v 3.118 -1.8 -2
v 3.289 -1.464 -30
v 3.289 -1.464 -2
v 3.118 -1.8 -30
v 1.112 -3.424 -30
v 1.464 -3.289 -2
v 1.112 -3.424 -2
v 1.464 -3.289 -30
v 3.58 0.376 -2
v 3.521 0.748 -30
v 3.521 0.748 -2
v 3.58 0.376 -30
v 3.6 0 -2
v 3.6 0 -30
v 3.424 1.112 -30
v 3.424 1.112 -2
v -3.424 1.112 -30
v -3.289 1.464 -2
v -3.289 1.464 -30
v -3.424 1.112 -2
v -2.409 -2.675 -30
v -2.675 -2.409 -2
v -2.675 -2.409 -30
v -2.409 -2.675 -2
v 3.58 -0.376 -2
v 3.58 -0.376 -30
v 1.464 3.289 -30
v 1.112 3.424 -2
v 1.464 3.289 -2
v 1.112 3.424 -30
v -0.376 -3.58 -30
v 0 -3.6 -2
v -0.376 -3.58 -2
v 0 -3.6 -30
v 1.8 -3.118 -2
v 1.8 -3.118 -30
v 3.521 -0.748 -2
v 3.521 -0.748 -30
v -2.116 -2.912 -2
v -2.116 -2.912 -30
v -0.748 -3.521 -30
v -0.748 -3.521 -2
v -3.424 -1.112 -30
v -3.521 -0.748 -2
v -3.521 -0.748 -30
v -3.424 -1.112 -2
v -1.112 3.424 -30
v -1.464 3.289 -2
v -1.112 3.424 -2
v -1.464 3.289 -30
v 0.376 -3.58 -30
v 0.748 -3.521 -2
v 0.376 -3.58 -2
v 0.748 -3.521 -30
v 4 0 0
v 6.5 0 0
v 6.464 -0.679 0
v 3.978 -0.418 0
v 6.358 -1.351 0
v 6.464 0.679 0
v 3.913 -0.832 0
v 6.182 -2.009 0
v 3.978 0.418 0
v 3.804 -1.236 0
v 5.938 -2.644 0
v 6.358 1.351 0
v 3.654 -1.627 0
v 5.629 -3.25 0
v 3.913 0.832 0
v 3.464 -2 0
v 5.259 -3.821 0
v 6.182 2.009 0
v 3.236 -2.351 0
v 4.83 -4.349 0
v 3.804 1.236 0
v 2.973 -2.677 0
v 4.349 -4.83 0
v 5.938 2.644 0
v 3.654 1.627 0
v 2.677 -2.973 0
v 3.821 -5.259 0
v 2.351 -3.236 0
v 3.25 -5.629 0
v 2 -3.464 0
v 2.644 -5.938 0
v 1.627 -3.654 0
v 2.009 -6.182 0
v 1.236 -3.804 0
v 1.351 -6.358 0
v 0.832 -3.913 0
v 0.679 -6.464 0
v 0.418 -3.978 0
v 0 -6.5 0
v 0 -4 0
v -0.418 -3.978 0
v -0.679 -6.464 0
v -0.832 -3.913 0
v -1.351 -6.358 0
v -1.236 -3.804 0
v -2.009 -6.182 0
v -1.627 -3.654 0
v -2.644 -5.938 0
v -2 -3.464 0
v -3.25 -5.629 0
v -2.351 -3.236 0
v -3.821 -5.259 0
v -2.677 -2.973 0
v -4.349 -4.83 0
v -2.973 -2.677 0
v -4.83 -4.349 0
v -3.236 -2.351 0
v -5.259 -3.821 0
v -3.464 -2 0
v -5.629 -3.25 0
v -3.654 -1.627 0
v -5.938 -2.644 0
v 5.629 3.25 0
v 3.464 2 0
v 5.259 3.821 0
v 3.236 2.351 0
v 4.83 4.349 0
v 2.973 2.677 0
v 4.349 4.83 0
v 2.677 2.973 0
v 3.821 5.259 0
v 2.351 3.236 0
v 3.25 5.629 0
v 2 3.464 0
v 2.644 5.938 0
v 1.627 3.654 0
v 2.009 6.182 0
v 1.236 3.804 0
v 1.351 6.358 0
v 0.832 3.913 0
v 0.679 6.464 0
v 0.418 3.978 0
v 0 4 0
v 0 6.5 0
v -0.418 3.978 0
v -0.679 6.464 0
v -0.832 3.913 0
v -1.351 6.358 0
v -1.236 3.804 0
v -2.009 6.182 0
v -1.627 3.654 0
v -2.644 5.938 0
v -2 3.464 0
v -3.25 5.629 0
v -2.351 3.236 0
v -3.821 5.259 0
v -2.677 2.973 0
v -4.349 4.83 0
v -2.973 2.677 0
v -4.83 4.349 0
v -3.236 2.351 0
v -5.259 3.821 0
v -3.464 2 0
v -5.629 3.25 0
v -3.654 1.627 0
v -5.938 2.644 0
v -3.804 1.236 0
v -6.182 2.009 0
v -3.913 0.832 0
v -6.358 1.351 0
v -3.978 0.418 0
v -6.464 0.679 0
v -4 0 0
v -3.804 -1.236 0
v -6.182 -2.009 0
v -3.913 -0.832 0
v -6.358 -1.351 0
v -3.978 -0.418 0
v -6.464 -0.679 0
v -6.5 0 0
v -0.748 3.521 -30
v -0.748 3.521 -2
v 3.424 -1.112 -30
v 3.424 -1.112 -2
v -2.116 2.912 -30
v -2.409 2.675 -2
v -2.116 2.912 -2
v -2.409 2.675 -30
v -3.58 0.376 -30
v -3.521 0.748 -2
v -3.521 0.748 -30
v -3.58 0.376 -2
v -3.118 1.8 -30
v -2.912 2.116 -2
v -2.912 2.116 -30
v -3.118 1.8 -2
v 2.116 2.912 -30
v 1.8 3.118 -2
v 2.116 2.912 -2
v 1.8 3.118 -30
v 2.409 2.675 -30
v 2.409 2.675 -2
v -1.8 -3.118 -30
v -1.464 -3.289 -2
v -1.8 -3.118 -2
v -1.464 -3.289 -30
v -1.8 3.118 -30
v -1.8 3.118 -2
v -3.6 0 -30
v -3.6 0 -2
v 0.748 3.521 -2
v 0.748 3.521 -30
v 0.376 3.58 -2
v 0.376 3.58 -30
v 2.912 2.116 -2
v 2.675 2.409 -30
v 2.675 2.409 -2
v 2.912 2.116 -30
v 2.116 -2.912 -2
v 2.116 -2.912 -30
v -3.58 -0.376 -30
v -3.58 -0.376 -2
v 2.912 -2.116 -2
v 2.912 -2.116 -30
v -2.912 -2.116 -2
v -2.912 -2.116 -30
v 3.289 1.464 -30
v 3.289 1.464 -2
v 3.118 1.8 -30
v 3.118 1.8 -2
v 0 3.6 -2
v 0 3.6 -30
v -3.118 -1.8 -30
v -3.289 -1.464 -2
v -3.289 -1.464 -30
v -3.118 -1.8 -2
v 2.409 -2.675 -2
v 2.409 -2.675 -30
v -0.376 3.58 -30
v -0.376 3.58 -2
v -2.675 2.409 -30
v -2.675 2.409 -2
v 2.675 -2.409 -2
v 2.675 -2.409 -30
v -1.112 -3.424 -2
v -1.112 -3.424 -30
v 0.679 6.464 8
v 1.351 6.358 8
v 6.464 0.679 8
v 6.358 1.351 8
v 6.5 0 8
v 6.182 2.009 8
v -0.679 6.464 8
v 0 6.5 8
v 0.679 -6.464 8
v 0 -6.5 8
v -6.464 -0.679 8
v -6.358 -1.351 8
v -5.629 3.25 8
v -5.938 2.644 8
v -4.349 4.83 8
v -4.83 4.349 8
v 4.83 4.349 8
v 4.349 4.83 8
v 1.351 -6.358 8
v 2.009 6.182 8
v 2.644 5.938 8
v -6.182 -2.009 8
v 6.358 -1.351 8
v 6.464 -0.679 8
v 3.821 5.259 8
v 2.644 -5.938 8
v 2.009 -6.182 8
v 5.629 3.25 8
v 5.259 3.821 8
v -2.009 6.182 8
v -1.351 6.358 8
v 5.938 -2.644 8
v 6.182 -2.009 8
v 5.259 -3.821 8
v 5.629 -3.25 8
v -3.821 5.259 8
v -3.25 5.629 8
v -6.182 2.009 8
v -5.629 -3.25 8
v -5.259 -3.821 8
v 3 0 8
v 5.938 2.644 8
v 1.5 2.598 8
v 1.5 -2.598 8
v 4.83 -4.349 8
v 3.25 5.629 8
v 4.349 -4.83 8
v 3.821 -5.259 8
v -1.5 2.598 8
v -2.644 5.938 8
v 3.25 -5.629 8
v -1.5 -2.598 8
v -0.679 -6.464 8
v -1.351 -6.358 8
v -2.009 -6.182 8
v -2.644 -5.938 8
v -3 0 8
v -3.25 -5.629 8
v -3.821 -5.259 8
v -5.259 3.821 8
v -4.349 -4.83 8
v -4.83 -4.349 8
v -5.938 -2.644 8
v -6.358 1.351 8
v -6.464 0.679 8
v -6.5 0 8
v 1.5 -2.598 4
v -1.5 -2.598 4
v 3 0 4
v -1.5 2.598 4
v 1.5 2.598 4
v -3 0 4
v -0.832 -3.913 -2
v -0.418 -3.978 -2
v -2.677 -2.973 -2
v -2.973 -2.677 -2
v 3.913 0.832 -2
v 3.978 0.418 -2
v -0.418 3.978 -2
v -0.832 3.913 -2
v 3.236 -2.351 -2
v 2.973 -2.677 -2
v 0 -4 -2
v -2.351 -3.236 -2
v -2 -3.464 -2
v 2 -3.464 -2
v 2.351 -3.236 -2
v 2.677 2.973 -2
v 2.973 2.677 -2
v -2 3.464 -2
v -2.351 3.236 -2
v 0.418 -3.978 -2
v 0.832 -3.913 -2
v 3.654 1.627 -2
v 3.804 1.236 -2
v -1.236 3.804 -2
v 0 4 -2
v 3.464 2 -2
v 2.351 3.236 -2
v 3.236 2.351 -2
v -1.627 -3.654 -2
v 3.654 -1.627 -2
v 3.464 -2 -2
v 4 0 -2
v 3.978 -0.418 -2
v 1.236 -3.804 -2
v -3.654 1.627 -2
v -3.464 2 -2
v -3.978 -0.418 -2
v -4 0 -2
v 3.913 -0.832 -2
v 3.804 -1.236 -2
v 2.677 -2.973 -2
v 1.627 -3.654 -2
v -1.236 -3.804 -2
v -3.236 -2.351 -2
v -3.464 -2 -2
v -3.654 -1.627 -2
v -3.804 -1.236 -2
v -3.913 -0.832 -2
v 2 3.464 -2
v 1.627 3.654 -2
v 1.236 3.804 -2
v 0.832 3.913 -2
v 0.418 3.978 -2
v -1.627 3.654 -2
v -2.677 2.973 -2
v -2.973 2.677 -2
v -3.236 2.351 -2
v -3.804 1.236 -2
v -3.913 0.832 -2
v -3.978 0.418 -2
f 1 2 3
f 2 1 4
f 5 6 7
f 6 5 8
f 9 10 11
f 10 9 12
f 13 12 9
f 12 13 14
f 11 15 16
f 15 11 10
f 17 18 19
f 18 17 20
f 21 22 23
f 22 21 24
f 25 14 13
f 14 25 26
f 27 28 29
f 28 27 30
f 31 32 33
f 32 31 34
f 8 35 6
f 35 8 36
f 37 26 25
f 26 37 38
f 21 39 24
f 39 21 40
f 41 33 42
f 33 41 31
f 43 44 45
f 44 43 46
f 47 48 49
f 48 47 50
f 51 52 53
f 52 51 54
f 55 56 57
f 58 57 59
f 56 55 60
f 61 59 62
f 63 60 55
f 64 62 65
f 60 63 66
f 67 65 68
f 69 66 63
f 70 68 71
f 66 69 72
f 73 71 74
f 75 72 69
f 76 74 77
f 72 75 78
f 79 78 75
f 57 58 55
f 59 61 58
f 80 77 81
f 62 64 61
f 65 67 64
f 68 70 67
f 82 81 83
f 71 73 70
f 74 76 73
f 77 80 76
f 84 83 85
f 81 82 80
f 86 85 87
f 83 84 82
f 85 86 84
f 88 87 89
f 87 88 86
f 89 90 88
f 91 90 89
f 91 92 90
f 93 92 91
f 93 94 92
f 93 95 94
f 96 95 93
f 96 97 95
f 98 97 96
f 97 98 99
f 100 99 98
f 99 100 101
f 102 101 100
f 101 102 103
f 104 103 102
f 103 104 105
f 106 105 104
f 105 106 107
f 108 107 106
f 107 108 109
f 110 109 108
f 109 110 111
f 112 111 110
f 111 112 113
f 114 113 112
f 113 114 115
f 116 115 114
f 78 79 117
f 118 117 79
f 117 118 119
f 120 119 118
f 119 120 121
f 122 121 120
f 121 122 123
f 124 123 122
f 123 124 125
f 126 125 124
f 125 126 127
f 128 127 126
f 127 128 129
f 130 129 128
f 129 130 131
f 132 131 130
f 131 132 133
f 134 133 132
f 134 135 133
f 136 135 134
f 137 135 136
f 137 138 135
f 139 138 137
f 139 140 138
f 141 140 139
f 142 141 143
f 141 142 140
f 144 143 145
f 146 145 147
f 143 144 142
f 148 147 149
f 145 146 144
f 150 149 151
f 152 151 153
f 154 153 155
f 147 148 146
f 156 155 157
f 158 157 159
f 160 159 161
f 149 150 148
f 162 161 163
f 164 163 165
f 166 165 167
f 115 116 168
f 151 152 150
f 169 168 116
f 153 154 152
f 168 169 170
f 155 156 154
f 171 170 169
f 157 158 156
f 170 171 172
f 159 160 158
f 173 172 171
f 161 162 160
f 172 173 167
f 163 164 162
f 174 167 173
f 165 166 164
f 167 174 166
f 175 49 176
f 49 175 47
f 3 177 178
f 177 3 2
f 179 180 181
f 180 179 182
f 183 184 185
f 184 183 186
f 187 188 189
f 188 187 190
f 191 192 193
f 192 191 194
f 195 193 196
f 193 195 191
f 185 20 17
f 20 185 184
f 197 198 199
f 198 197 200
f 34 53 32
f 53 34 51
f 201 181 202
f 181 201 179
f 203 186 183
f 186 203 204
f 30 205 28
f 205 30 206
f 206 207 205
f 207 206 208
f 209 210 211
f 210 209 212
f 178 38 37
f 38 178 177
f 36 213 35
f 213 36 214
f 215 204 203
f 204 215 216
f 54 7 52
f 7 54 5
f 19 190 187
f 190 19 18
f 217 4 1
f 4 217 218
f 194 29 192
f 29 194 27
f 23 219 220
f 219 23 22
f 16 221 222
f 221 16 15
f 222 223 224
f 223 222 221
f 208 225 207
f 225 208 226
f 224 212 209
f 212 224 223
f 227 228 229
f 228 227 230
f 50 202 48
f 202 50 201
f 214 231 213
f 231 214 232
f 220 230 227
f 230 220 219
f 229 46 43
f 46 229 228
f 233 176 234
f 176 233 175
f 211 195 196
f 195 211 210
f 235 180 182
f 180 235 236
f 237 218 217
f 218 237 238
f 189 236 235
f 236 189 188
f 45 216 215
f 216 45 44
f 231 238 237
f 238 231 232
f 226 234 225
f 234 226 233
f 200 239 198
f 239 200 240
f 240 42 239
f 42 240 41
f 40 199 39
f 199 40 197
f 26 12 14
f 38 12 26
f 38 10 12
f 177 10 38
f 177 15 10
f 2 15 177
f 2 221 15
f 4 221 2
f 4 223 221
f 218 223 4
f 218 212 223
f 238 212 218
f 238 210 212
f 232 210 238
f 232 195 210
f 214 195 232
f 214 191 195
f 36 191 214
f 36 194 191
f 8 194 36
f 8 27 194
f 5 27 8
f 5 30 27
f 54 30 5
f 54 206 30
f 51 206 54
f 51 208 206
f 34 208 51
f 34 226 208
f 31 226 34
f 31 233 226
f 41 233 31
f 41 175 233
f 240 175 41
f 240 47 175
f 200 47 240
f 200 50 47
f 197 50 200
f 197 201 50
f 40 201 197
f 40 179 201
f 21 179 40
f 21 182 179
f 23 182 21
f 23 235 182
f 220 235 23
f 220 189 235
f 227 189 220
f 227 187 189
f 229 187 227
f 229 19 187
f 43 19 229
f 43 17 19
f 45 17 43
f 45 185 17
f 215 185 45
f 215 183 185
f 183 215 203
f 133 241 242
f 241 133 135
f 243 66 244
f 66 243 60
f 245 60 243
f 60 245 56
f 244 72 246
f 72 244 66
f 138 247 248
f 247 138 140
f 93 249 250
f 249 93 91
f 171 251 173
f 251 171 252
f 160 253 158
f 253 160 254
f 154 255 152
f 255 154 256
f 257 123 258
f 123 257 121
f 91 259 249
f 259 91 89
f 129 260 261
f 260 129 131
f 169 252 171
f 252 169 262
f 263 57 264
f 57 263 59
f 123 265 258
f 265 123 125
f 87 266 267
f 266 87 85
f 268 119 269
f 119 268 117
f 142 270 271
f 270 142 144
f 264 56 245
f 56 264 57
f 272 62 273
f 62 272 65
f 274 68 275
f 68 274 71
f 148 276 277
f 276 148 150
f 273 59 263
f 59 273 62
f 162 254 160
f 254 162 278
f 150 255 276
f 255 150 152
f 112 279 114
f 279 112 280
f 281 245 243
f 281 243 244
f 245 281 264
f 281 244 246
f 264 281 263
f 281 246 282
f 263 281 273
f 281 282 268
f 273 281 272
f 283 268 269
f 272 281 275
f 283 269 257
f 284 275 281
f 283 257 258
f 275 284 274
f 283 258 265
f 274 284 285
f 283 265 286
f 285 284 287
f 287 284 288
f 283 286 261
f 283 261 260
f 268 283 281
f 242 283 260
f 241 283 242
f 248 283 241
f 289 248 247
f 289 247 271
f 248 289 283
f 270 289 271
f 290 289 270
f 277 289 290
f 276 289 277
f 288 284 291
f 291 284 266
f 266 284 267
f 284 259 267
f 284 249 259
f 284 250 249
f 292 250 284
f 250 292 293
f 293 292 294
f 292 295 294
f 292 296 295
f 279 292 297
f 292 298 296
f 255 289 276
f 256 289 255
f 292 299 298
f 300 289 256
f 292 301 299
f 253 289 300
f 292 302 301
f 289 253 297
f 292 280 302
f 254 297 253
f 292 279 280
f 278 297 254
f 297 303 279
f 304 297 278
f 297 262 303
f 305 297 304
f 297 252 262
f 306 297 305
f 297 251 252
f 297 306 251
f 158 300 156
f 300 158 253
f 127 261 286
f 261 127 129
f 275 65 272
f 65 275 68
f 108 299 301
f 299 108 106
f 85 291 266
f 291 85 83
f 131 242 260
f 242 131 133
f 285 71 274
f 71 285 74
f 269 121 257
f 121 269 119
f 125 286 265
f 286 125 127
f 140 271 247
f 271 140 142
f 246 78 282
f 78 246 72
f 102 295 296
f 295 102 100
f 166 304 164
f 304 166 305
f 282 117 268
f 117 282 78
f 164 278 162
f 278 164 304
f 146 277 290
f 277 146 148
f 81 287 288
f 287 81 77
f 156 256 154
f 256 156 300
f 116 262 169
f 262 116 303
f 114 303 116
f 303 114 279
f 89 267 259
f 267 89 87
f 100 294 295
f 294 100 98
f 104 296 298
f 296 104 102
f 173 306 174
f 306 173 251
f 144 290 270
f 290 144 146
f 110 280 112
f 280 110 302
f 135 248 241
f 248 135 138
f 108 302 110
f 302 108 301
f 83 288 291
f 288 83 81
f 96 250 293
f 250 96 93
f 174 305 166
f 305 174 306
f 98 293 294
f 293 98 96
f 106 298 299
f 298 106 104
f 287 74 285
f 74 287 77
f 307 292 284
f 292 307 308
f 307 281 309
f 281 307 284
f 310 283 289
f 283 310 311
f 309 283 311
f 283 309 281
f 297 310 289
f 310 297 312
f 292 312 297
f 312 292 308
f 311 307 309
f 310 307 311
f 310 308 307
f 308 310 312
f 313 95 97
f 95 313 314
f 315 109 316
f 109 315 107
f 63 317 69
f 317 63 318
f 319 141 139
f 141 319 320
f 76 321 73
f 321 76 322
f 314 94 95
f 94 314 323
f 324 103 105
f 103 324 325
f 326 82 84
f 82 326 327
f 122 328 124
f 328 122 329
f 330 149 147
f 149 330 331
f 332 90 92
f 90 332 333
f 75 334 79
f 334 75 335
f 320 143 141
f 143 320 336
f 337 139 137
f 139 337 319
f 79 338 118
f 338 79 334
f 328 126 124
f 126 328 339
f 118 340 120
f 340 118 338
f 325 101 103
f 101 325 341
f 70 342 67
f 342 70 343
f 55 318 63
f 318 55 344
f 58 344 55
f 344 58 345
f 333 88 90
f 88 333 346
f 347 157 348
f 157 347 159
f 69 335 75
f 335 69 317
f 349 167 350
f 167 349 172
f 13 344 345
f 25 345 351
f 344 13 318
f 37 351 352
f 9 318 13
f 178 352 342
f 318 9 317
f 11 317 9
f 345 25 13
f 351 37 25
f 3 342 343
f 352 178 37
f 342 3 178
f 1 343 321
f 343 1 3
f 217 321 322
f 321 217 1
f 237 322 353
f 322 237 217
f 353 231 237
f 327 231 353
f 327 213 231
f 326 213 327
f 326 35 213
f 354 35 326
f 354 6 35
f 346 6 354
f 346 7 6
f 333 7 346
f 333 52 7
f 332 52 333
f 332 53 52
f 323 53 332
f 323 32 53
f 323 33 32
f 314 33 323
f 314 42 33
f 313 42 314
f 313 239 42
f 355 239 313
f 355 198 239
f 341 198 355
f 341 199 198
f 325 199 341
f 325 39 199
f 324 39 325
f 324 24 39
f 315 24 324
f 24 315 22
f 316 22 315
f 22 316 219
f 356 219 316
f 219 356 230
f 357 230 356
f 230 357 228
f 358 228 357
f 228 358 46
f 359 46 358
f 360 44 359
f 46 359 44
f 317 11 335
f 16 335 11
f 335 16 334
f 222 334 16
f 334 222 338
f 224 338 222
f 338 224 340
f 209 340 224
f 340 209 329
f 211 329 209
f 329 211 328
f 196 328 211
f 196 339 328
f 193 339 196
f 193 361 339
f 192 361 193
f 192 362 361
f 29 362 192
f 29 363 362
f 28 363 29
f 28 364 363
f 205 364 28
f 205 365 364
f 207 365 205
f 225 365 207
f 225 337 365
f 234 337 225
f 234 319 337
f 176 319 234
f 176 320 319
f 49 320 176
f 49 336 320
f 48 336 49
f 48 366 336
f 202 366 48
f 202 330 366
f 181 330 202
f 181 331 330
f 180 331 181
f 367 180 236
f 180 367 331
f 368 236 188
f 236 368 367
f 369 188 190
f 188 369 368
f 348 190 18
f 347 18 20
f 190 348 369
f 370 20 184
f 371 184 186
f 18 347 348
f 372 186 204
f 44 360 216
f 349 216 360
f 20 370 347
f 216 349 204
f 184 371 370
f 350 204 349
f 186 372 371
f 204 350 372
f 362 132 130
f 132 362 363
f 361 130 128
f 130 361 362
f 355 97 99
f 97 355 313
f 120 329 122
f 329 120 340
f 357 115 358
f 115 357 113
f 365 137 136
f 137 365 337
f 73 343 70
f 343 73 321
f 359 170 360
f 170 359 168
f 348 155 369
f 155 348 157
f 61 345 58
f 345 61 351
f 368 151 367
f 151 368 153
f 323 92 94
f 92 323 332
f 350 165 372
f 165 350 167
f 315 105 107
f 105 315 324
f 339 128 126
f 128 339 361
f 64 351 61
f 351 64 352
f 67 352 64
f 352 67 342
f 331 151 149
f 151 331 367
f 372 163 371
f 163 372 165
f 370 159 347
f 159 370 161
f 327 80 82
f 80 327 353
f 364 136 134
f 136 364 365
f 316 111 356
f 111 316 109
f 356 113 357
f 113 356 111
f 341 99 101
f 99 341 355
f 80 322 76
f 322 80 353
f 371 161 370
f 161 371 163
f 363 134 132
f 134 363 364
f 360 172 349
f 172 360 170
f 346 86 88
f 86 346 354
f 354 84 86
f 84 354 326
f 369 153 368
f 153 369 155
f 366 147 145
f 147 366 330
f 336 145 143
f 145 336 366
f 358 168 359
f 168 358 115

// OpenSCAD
/*
DIN 912 Z GWINTEM PO CZĘŚCI
*/

$fn = 60;

DIN912g(8,30);
module DIN912g(gwint,dlugosc)
{
    //Parametry śruby:
    {
        //Parametry śruby:
        //szerokość łba
        function dk(gwint) = lookup(gwint, [[3,5.5],[4,7],[5,8.5],[6,10],[8,13],[10,16],[12,18],[14,21],[16,24],[20,30]]);
        dk=dk(gwint);
        //grubość łba
        function k(gwint) = lookup(gwint, [[3,3],[4,4],[5,5],[6,6],[8,8],[10,10],[12,12],[14,14],[16,16],[20,20]]);
        k=k(gwint);
        //gniazdo 60-kątne
        function s(gwint) = lookup(gwint, [[3,2.5],[4,3],[5,4],[6,5],[8,6],[10,8],[12,10],[14,12],[16,14],[20,17]]);
        s=s(gwint);
        //Długość części gwintowanej
        function b(gwint) = lookup(gwint, [[3,18],[4,20],[5,22],[6,24],[8,28],[10,32],[12,36],[14,40],[16,44.0],[18,48.0],[20,52.0],[24,56.0]]);
        b=b(gwint);
        //L=[3,5-30],[4,6-40],[5,8-50],[6,10-60],[8,12-80],[10,16-100],[12,20-120],[14,25-140]
        //Definicja kolorów
        aluminum = [0.9, 0.9, 0.9];
        steel = [0.8, 0.8, 0.9];
    }
    
{
                translate([0, 0, -dlugosc])

                union()
    {
                color(steel,1)
            difference() 
    {
            union()
    {

    cylinder(h=dlugosc, d=gwint*0.9, center=false);
    
            translate([0, 0, dlugosc])
        cylinder(h=k, d=dk, center=false);
    }
                translate([0, 0, dlugosc+k])
        cylinder(h=k, d=s,$fn=6,center = true);
}
            color([0.7,0.8,0.8,0.5])
                translate([0, 0, b])
    cylinder(h=dlugosc-b, d=gwint, center=false);
}

}
}
